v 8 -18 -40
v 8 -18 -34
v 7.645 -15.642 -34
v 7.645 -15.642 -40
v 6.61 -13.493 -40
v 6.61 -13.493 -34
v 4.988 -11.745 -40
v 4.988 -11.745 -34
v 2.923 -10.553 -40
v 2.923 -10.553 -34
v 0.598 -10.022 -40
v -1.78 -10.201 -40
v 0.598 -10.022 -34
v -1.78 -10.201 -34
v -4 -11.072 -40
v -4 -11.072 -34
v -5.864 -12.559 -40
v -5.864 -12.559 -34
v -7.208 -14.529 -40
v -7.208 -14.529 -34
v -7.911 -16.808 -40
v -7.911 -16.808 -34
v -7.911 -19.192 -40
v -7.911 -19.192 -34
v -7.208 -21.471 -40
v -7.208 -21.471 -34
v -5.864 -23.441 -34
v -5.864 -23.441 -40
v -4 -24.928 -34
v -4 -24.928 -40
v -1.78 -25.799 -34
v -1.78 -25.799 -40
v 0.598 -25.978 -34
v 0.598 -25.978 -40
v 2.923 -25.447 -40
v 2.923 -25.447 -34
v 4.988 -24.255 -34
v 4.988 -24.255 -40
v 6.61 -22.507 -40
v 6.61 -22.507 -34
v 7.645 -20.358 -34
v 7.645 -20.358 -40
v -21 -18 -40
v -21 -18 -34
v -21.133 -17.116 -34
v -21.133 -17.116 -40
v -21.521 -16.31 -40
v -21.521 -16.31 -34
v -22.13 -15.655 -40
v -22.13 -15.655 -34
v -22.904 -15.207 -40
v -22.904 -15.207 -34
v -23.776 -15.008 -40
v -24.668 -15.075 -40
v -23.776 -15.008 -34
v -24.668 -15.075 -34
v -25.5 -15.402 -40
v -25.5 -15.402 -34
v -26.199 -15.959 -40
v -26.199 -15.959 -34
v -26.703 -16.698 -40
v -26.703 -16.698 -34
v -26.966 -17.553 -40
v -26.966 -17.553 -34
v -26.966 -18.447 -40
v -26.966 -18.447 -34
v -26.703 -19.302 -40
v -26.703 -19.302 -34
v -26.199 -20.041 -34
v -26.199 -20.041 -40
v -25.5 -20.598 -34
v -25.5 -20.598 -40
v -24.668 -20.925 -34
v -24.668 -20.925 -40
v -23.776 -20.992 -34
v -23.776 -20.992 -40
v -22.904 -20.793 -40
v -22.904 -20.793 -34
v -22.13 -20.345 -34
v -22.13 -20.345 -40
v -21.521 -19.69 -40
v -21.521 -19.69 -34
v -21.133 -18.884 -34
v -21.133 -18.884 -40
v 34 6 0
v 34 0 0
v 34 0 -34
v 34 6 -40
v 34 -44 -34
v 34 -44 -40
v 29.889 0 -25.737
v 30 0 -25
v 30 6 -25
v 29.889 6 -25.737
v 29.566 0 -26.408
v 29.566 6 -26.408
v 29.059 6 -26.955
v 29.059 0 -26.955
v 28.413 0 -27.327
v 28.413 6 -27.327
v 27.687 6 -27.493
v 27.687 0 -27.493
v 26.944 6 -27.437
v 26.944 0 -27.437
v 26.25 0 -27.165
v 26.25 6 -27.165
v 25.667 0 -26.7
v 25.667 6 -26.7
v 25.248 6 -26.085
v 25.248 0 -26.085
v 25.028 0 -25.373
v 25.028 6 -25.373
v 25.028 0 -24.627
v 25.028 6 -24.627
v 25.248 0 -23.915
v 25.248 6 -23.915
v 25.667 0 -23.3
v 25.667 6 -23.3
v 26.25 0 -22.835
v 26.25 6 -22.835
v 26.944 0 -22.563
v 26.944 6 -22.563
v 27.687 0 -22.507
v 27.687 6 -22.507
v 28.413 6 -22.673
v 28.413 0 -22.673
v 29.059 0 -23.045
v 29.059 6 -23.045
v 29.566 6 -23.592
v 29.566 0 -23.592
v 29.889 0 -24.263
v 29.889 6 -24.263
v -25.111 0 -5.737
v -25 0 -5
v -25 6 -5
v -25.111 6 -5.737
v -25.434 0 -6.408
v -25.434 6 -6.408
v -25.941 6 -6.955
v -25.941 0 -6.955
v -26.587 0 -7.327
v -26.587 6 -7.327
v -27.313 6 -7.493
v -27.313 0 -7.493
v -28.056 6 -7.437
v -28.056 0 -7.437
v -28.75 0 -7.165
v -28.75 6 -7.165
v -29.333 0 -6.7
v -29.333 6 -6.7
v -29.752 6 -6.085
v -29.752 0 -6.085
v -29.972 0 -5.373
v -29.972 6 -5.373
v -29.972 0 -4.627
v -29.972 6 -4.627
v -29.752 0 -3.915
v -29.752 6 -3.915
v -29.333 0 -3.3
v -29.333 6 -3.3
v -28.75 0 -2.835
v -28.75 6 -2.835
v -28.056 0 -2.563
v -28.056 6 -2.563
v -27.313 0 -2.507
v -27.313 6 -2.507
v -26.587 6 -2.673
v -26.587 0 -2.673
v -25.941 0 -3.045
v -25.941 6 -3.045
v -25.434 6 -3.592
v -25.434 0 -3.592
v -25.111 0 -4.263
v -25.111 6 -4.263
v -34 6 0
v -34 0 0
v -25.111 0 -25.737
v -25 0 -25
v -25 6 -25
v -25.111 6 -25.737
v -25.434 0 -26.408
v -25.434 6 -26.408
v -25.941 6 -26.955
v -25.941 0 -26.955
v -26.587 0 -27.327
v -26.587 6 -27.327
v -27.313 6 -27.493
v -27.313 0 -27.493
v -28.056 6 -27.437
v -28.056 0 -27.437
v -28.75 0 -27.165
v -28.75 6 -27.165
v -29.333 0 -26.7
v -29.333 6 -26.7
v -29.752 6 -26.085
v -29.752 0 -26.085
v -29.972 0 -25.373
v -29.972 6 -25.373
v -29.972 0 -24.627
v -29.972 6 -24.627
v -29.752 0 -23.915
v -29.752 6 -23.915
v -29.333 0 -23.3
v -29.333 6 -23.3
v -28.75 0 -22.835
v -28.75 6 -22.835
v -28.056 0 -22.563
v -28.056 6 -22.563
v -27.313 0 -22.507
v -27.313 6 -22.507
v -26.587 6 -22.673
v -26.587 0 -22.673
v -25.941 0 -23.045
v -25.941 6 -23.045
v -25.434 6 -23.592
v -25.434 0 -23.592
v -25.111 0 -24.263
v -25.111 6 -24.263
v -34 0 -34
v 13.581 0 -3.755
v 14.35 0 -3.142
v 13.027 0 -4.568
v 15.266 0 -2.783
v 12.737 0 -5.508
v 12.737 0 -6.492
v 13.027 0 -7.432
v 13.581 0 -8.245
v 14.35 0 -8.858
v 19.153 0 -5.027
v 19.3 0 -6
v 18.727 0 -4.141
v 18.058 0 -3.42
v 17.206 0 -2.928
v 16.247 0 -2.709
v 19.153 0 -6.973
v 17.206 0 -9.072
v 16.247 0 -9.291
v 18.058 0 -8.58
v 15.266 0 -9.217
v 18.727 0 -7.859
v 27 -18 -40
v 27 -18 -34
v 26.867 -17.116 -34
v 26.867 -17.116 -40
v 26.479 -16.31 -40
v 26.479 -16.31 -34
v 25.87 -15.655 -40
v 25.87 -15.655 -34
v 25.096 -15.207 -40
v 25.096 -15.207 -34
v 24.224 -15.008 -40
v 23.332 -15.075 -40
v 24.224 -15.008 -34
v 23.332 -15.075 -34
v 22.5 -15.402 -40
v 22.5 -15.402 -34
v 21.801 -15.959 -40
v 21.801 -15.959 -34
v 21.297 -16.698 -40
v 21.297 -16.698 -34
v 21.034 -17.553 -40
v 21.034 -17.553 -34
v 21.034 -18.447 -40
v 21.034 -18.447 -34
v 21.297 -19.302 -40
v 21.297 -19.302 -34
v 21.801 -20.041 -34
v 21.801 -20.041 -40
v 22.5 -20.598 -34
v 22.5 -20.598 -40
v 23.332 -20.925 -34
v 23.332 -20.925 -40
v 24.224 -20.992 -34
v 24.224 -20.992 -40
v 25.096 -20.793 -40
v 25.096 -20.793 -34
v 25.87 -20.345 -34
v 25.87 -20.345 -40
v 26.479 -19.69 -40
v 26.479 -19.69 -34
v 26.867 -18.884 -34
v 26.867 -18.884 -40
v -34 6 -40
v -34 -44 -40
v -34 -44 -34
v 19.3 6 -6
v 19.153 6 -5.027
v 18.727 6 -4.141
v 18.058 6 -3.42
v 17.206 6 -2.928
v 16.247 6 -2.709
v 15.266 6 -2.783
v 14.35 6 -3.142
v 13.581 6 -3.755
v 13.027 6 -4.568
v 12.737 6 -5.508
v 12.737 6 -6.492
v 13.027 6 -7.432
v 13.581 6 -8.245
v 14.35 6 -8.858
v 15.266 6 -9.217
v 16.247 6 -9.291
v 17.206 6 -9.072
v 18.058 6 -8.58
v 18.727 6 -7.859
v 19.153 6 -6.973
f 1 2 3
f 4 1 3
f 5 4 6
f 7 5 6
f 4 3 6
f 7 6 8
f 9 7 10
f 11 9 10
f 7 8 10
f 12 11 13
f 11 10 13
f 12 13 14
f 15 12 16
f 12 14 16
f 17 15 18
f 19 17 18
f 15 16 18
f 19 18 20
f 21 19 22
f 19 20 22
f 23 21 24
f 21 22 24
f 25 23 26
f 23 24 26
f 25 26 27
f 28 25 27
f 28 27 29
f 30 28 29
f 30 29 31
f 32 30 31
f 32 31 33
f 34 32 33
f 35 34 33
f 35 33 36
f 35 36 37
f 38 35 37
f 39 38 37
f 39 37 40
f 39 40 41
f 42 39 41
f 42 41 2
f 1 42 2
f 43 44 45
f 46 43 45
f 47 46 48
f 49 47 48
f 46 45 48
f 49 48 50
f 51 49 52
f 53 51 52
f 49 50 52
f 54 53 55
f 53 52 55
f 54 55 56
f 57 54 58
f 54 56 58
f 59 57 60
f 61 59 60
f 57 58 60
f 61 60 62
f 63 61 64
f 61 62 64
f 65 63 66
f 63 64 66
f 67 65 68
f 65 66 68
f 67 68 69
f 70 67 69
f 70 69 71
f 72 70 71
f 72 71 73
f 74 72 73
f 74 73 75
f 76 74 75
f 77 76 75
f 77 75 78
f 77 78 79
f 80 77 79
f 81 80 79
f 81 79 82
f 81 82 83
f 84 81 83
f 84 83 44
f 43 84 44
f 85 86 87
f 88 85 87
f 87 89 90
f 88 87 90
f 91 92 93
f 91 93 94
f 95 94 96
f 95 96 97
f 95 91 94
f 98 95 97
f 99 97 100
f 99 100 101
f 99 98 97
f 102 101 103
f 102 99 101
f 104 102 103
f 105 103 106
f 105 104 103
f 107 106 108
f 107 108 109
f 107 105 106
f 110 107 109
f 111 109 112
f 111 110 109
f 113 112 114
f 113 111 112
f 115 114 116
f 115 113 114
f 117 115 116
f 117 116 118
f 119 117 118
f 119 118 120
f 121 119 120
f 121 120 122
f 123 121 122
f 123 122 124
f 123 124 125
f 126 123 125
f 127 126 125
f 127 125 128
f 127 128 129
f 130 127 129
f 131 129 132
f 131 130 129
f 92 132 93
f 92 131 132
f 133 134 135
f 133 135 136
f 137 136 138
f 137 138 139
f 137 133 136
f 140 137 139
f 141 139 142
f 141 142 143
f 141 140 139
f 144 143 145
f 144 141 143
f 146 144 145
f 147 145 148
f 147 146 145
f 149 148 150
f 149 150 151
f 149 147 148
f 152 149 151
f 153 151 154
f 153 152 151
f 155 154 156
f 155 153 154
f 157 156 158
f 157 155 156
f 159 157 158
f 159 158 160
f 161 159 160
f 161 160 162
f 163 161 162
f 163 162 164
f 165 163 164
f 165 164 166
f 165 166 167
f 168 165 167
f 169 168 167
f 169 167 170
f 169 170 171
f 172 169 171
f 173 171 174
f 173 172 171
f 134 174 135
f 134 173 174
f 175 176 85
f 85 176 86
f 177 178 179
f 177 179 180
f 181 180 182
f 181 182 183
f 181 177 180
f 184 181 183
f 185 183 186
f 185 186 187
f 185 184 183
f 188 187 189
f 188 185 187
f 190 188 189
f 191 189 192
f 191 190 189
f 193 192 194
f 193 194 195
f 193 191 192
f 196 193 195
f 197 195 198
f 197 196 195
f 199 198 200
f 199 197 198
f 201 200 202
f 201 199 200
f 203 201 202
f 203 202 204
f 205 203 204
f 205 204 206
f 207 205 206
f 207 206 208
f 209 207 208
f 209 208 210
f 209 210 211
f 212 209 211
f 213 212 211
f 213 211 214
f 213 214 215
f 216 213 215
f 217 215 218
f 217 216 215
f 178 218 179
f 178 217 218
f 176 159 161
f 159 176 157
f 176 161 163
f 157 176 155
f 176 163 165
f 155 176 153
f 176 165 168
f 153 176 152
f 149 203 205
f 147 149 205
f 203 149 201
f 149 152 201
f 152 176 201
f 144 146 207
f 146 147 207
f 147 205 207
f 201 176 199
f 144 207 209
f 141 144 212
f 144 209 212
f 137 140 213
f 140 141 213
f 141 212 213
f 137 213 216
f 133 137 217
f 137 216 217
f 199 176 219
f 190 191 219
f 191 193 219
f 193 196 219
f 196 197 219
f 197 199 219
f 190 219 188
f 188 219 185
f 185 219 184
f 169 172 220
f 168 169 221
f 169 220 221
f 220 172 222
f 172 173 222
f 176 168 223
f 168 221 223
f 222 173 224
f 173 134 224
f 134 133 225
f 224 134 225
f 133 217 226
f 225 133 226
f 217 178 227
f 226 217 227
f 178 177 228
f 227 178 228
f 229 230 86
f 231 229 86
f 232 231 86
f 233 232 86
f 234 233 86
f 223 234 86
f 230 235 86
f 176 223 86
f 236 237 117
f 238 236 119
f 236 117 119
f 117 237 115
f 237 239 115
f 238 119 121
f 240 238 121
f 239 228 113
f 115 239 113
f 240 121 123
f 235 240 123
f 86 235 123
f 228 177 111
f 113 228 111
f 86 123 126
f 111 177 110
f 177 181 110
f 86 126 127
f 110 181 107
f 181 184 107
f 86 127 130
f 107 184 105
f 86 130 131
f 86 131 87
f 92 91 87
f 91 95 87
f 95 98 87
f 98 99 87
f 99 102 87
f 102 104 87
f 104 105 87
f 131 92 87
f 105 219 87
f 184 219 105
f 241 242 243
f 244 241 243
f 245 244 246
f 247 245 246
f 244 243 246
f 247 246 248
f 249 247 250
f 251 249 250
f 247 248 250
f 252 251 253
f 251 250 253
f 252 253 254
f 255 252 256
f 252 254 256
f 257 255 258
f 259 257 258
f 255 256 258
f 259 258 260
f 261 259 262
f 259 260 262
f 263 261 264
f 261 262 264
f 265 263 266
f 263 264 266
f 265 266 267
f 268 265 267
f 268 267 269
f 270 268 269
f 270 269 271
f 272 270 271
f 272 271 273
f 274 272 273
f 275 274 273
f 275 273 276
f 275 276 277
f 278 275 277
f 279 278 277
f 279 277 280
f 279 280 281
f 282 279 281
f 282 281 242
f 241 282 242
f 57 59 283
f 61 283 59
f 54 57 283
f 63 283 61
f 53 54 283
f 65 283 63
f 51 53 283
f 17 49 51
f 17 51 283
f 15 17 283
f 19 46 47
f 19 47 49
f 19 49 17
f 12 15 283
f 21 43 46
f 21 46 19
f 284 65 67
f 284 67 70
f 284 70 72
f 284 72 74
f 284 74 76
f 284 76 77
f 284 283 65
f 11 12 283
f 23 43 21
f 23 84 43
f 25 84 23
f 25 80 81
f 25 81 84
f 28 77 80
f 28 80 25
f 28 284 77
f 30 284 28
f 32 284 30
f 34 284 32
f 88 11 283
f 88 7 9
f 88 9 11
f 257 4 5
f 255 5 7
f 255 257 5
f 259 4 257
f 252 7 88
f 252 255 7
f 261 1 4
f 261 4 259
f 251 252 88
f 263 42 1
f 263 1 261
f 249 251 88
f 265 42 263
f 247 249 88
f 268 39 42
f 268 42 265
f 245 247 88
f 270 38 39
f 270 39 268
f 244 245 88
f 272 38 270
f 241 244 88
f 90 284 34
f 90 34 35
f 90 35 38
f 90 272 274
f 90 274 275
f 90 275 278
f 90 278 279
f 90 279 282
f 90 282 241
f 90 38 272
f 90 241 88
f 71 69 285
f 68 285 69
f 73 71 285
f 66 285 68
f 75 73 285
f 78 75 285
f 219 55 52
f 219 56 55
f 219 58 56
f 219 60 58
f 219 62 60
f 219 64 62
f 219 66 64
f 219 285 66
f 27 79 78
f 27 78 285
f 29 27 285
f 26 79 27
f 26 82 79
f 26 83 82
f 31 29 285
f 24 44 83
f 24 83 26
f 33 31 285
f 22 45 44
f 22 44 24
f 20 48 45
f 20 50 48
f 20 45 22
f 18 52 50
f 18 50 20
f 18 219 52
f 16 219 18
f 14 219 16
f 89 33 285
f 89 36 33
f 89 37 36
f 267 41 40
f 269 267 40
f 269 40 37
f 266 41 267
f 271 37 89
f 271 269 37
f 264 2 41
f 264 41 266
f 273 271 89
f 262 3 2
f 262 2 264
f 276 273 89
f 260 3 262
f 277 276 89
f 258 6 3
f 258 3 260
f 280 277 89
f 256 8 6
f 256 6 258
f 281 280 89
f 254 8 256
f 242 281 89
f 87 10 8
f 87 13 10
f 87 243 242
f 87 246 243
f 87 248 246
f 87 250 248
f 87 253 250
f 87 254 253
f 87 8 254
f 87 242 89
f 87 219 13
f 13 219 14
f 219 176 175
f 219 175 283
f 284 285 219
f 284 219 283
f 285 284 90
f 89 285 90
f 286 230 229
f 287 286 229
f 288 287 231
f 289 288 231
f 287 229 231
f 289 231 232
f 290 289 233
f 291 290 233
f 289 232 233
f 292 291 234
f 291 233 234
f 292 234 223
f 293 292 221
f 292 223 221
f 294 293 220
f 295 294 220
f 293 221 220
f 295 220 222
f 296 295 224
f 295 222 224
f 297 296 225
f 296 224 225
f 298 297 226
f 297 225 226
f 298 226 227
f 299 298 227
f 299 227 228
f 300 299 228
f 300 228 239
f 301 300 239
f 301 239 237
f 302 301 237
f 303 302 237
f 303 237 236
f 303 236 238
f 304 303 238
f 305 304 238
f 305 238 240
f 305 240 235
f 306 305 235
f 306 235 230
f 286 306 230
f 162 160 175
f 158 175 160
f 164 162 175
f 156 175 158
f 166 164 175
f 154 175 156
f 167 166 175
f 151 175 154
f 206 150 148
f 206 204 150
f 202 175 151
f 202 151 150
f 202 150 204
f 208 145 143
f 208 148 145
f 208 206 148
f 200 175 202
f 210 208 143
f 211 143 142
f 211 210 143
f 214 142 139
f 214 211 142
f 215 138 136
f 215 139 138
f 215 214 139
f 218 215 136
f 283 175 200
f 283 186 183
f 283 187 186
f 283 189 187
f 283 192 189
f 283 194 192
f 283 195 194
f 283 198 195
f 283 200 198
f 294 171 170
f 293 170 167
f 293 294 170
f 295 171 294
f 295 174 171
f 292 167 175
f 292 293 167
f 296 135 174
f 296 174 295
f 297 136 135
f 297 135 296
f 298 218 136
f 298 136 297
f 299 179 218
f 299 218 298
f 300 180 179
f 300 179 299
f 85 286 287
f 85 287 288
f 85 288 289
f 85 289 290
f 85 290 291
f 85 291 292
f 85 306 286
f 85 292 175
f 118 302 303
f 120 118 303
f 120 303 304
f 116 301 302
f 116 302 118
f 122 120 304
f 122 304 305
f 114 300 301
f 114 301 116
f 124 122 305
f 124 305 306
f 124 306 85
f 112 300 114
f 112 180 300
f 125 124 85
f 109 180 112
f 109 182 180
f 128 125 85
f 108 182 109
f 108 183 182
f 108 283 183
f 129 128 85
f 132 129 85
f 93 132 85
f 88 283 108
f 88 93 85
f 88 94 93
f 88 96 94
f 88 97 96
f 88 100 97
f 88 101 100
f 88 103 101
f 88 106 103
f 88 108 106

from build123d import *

# Parameters (mm, degrees)
SKETCH_1_W          = 68
SKETCH_1_H          = 40
SKETCH_1_R          = 2.5
EXTRUDE_1_DEPTH     = 6
SKETCH_3_W          = 68
SKETCH_3_H          = 6
EXTRUDE_2_DEPTH     = 50
CUT_EXTRUDE_1_REACH = 8
SKETCH_4_R          = 8
SKETCH_4_R_2        = 3
SKETCH_5_R          = 3.3
CUT_EXTRUDE_2_DEPTH = 10


with BuildPart() as part:
    # 草图1 → 凸台-拉伸1 (new body)
    with BuildSketch(Plane(origin=(0, 0, 0), x_dir=(1, 0, 0), z_dir=(0, 1, 0))):
        with Locations((0, 20)):
            Rectangle(SKETCH_1_W, SKETCH_1_H)
        with Locations((-27.5, 25)):
            Circle(SKETCH_1_R, mode=Mode.SUBTRACT)
        with Locations((27.5, 25)):
            Circle(SKETCH_1_R, mode=Mode.SUBTRACT)
        with Locations((-27.5, 5)):
            Circle(SKETCH_1_R, mode=Mode.SUBTRACT)
    extrude(amount=EXTRUDE_1_DEPTH)

    # 草图3 → 凸台-拉伸2 (add)
    with BuildSketch(Plane(origin=(0, 6, 0), x_dir=(1, 0, 0), z_dir=(0, 1, 0))):
        with Locations((0, 37)):
            Rectangle(SKETCH_3_W, SKETCH_3_H)
    extrude(amount=-EXTRUDE_2_DEPTH)

    # 草图4 → 切除-拉伸1 (cut, up to next)
    with BuildSketch(Plane.XY.offset(-34), mode=Mode.PRIVATE) as cut_extrude_1_sk1:
        with Locations((0, -18)):
            Circle(SKETCH_4_R)
    cut_extrude_1_tool1 = extrude(cut_extrude_1_sk1.sketch, amount=-CUT_EXTRUDE_1_REACH, mode=Mode.PRIVATE) & part.part
    add(cut_extrude_1_tool1.solids().sort_by_distance((0, -18, -34))[0], mode=Mode.SUBTRACT)
    # 草图4 → 切除-拉伸1 (cut, up to next)
    with BuildSketch(Plane.XY.offset(-34), mode=Mode.PRIVATE) as cut_extrude_1_sk2:
        with Locations((24, -18)):
            Circle(SKETCH_4_R_2)
    cut_extrude_1_tool2 = extrude(cut_extrude_1_sk2.sketch, amount=-CUT_EXTRUDE_1_REACH, mode=Mode.PRIVATE) & part.part
    add(cut_extrude_1_tool2.solids().sort_by_distance((24, -18, -34))[0], mode=Mode.SUBTRACT)
    # 草图4 → 切除-拉伸1 (cut, up to next)
    with BuildSketch(Plane.XY.offset(-34), mode=Mode.PRIVATE) as cut_extrude_1_sk3:
        with Locations((-24, -18)):
            Circle(SKETCH_4_R_2)
    cut_extrude_1_tool3 = extrude(cut_extrude_1_sk3.sketch, amount=-CUT_EXTRUDE_1_REACH, mode=Mode.PRIVATE) & part.part
    add(cut_extrude_1_tool3.solids().sort_by_distance((-24, -18, -34))[0], mode=Mode.SUBTRACT)

    # 草图5 → 切除-拉伸2 (cut)
    with BuildSketch(Plane.XZ):
        with Locations((15.999999998, -6)):
            Circle(SKETCH_5_R)
    extrude(amount=-CUT_EXTRUDE_2_DEPTH, mode=Mode.SUBTRACT)


solid = part.part
